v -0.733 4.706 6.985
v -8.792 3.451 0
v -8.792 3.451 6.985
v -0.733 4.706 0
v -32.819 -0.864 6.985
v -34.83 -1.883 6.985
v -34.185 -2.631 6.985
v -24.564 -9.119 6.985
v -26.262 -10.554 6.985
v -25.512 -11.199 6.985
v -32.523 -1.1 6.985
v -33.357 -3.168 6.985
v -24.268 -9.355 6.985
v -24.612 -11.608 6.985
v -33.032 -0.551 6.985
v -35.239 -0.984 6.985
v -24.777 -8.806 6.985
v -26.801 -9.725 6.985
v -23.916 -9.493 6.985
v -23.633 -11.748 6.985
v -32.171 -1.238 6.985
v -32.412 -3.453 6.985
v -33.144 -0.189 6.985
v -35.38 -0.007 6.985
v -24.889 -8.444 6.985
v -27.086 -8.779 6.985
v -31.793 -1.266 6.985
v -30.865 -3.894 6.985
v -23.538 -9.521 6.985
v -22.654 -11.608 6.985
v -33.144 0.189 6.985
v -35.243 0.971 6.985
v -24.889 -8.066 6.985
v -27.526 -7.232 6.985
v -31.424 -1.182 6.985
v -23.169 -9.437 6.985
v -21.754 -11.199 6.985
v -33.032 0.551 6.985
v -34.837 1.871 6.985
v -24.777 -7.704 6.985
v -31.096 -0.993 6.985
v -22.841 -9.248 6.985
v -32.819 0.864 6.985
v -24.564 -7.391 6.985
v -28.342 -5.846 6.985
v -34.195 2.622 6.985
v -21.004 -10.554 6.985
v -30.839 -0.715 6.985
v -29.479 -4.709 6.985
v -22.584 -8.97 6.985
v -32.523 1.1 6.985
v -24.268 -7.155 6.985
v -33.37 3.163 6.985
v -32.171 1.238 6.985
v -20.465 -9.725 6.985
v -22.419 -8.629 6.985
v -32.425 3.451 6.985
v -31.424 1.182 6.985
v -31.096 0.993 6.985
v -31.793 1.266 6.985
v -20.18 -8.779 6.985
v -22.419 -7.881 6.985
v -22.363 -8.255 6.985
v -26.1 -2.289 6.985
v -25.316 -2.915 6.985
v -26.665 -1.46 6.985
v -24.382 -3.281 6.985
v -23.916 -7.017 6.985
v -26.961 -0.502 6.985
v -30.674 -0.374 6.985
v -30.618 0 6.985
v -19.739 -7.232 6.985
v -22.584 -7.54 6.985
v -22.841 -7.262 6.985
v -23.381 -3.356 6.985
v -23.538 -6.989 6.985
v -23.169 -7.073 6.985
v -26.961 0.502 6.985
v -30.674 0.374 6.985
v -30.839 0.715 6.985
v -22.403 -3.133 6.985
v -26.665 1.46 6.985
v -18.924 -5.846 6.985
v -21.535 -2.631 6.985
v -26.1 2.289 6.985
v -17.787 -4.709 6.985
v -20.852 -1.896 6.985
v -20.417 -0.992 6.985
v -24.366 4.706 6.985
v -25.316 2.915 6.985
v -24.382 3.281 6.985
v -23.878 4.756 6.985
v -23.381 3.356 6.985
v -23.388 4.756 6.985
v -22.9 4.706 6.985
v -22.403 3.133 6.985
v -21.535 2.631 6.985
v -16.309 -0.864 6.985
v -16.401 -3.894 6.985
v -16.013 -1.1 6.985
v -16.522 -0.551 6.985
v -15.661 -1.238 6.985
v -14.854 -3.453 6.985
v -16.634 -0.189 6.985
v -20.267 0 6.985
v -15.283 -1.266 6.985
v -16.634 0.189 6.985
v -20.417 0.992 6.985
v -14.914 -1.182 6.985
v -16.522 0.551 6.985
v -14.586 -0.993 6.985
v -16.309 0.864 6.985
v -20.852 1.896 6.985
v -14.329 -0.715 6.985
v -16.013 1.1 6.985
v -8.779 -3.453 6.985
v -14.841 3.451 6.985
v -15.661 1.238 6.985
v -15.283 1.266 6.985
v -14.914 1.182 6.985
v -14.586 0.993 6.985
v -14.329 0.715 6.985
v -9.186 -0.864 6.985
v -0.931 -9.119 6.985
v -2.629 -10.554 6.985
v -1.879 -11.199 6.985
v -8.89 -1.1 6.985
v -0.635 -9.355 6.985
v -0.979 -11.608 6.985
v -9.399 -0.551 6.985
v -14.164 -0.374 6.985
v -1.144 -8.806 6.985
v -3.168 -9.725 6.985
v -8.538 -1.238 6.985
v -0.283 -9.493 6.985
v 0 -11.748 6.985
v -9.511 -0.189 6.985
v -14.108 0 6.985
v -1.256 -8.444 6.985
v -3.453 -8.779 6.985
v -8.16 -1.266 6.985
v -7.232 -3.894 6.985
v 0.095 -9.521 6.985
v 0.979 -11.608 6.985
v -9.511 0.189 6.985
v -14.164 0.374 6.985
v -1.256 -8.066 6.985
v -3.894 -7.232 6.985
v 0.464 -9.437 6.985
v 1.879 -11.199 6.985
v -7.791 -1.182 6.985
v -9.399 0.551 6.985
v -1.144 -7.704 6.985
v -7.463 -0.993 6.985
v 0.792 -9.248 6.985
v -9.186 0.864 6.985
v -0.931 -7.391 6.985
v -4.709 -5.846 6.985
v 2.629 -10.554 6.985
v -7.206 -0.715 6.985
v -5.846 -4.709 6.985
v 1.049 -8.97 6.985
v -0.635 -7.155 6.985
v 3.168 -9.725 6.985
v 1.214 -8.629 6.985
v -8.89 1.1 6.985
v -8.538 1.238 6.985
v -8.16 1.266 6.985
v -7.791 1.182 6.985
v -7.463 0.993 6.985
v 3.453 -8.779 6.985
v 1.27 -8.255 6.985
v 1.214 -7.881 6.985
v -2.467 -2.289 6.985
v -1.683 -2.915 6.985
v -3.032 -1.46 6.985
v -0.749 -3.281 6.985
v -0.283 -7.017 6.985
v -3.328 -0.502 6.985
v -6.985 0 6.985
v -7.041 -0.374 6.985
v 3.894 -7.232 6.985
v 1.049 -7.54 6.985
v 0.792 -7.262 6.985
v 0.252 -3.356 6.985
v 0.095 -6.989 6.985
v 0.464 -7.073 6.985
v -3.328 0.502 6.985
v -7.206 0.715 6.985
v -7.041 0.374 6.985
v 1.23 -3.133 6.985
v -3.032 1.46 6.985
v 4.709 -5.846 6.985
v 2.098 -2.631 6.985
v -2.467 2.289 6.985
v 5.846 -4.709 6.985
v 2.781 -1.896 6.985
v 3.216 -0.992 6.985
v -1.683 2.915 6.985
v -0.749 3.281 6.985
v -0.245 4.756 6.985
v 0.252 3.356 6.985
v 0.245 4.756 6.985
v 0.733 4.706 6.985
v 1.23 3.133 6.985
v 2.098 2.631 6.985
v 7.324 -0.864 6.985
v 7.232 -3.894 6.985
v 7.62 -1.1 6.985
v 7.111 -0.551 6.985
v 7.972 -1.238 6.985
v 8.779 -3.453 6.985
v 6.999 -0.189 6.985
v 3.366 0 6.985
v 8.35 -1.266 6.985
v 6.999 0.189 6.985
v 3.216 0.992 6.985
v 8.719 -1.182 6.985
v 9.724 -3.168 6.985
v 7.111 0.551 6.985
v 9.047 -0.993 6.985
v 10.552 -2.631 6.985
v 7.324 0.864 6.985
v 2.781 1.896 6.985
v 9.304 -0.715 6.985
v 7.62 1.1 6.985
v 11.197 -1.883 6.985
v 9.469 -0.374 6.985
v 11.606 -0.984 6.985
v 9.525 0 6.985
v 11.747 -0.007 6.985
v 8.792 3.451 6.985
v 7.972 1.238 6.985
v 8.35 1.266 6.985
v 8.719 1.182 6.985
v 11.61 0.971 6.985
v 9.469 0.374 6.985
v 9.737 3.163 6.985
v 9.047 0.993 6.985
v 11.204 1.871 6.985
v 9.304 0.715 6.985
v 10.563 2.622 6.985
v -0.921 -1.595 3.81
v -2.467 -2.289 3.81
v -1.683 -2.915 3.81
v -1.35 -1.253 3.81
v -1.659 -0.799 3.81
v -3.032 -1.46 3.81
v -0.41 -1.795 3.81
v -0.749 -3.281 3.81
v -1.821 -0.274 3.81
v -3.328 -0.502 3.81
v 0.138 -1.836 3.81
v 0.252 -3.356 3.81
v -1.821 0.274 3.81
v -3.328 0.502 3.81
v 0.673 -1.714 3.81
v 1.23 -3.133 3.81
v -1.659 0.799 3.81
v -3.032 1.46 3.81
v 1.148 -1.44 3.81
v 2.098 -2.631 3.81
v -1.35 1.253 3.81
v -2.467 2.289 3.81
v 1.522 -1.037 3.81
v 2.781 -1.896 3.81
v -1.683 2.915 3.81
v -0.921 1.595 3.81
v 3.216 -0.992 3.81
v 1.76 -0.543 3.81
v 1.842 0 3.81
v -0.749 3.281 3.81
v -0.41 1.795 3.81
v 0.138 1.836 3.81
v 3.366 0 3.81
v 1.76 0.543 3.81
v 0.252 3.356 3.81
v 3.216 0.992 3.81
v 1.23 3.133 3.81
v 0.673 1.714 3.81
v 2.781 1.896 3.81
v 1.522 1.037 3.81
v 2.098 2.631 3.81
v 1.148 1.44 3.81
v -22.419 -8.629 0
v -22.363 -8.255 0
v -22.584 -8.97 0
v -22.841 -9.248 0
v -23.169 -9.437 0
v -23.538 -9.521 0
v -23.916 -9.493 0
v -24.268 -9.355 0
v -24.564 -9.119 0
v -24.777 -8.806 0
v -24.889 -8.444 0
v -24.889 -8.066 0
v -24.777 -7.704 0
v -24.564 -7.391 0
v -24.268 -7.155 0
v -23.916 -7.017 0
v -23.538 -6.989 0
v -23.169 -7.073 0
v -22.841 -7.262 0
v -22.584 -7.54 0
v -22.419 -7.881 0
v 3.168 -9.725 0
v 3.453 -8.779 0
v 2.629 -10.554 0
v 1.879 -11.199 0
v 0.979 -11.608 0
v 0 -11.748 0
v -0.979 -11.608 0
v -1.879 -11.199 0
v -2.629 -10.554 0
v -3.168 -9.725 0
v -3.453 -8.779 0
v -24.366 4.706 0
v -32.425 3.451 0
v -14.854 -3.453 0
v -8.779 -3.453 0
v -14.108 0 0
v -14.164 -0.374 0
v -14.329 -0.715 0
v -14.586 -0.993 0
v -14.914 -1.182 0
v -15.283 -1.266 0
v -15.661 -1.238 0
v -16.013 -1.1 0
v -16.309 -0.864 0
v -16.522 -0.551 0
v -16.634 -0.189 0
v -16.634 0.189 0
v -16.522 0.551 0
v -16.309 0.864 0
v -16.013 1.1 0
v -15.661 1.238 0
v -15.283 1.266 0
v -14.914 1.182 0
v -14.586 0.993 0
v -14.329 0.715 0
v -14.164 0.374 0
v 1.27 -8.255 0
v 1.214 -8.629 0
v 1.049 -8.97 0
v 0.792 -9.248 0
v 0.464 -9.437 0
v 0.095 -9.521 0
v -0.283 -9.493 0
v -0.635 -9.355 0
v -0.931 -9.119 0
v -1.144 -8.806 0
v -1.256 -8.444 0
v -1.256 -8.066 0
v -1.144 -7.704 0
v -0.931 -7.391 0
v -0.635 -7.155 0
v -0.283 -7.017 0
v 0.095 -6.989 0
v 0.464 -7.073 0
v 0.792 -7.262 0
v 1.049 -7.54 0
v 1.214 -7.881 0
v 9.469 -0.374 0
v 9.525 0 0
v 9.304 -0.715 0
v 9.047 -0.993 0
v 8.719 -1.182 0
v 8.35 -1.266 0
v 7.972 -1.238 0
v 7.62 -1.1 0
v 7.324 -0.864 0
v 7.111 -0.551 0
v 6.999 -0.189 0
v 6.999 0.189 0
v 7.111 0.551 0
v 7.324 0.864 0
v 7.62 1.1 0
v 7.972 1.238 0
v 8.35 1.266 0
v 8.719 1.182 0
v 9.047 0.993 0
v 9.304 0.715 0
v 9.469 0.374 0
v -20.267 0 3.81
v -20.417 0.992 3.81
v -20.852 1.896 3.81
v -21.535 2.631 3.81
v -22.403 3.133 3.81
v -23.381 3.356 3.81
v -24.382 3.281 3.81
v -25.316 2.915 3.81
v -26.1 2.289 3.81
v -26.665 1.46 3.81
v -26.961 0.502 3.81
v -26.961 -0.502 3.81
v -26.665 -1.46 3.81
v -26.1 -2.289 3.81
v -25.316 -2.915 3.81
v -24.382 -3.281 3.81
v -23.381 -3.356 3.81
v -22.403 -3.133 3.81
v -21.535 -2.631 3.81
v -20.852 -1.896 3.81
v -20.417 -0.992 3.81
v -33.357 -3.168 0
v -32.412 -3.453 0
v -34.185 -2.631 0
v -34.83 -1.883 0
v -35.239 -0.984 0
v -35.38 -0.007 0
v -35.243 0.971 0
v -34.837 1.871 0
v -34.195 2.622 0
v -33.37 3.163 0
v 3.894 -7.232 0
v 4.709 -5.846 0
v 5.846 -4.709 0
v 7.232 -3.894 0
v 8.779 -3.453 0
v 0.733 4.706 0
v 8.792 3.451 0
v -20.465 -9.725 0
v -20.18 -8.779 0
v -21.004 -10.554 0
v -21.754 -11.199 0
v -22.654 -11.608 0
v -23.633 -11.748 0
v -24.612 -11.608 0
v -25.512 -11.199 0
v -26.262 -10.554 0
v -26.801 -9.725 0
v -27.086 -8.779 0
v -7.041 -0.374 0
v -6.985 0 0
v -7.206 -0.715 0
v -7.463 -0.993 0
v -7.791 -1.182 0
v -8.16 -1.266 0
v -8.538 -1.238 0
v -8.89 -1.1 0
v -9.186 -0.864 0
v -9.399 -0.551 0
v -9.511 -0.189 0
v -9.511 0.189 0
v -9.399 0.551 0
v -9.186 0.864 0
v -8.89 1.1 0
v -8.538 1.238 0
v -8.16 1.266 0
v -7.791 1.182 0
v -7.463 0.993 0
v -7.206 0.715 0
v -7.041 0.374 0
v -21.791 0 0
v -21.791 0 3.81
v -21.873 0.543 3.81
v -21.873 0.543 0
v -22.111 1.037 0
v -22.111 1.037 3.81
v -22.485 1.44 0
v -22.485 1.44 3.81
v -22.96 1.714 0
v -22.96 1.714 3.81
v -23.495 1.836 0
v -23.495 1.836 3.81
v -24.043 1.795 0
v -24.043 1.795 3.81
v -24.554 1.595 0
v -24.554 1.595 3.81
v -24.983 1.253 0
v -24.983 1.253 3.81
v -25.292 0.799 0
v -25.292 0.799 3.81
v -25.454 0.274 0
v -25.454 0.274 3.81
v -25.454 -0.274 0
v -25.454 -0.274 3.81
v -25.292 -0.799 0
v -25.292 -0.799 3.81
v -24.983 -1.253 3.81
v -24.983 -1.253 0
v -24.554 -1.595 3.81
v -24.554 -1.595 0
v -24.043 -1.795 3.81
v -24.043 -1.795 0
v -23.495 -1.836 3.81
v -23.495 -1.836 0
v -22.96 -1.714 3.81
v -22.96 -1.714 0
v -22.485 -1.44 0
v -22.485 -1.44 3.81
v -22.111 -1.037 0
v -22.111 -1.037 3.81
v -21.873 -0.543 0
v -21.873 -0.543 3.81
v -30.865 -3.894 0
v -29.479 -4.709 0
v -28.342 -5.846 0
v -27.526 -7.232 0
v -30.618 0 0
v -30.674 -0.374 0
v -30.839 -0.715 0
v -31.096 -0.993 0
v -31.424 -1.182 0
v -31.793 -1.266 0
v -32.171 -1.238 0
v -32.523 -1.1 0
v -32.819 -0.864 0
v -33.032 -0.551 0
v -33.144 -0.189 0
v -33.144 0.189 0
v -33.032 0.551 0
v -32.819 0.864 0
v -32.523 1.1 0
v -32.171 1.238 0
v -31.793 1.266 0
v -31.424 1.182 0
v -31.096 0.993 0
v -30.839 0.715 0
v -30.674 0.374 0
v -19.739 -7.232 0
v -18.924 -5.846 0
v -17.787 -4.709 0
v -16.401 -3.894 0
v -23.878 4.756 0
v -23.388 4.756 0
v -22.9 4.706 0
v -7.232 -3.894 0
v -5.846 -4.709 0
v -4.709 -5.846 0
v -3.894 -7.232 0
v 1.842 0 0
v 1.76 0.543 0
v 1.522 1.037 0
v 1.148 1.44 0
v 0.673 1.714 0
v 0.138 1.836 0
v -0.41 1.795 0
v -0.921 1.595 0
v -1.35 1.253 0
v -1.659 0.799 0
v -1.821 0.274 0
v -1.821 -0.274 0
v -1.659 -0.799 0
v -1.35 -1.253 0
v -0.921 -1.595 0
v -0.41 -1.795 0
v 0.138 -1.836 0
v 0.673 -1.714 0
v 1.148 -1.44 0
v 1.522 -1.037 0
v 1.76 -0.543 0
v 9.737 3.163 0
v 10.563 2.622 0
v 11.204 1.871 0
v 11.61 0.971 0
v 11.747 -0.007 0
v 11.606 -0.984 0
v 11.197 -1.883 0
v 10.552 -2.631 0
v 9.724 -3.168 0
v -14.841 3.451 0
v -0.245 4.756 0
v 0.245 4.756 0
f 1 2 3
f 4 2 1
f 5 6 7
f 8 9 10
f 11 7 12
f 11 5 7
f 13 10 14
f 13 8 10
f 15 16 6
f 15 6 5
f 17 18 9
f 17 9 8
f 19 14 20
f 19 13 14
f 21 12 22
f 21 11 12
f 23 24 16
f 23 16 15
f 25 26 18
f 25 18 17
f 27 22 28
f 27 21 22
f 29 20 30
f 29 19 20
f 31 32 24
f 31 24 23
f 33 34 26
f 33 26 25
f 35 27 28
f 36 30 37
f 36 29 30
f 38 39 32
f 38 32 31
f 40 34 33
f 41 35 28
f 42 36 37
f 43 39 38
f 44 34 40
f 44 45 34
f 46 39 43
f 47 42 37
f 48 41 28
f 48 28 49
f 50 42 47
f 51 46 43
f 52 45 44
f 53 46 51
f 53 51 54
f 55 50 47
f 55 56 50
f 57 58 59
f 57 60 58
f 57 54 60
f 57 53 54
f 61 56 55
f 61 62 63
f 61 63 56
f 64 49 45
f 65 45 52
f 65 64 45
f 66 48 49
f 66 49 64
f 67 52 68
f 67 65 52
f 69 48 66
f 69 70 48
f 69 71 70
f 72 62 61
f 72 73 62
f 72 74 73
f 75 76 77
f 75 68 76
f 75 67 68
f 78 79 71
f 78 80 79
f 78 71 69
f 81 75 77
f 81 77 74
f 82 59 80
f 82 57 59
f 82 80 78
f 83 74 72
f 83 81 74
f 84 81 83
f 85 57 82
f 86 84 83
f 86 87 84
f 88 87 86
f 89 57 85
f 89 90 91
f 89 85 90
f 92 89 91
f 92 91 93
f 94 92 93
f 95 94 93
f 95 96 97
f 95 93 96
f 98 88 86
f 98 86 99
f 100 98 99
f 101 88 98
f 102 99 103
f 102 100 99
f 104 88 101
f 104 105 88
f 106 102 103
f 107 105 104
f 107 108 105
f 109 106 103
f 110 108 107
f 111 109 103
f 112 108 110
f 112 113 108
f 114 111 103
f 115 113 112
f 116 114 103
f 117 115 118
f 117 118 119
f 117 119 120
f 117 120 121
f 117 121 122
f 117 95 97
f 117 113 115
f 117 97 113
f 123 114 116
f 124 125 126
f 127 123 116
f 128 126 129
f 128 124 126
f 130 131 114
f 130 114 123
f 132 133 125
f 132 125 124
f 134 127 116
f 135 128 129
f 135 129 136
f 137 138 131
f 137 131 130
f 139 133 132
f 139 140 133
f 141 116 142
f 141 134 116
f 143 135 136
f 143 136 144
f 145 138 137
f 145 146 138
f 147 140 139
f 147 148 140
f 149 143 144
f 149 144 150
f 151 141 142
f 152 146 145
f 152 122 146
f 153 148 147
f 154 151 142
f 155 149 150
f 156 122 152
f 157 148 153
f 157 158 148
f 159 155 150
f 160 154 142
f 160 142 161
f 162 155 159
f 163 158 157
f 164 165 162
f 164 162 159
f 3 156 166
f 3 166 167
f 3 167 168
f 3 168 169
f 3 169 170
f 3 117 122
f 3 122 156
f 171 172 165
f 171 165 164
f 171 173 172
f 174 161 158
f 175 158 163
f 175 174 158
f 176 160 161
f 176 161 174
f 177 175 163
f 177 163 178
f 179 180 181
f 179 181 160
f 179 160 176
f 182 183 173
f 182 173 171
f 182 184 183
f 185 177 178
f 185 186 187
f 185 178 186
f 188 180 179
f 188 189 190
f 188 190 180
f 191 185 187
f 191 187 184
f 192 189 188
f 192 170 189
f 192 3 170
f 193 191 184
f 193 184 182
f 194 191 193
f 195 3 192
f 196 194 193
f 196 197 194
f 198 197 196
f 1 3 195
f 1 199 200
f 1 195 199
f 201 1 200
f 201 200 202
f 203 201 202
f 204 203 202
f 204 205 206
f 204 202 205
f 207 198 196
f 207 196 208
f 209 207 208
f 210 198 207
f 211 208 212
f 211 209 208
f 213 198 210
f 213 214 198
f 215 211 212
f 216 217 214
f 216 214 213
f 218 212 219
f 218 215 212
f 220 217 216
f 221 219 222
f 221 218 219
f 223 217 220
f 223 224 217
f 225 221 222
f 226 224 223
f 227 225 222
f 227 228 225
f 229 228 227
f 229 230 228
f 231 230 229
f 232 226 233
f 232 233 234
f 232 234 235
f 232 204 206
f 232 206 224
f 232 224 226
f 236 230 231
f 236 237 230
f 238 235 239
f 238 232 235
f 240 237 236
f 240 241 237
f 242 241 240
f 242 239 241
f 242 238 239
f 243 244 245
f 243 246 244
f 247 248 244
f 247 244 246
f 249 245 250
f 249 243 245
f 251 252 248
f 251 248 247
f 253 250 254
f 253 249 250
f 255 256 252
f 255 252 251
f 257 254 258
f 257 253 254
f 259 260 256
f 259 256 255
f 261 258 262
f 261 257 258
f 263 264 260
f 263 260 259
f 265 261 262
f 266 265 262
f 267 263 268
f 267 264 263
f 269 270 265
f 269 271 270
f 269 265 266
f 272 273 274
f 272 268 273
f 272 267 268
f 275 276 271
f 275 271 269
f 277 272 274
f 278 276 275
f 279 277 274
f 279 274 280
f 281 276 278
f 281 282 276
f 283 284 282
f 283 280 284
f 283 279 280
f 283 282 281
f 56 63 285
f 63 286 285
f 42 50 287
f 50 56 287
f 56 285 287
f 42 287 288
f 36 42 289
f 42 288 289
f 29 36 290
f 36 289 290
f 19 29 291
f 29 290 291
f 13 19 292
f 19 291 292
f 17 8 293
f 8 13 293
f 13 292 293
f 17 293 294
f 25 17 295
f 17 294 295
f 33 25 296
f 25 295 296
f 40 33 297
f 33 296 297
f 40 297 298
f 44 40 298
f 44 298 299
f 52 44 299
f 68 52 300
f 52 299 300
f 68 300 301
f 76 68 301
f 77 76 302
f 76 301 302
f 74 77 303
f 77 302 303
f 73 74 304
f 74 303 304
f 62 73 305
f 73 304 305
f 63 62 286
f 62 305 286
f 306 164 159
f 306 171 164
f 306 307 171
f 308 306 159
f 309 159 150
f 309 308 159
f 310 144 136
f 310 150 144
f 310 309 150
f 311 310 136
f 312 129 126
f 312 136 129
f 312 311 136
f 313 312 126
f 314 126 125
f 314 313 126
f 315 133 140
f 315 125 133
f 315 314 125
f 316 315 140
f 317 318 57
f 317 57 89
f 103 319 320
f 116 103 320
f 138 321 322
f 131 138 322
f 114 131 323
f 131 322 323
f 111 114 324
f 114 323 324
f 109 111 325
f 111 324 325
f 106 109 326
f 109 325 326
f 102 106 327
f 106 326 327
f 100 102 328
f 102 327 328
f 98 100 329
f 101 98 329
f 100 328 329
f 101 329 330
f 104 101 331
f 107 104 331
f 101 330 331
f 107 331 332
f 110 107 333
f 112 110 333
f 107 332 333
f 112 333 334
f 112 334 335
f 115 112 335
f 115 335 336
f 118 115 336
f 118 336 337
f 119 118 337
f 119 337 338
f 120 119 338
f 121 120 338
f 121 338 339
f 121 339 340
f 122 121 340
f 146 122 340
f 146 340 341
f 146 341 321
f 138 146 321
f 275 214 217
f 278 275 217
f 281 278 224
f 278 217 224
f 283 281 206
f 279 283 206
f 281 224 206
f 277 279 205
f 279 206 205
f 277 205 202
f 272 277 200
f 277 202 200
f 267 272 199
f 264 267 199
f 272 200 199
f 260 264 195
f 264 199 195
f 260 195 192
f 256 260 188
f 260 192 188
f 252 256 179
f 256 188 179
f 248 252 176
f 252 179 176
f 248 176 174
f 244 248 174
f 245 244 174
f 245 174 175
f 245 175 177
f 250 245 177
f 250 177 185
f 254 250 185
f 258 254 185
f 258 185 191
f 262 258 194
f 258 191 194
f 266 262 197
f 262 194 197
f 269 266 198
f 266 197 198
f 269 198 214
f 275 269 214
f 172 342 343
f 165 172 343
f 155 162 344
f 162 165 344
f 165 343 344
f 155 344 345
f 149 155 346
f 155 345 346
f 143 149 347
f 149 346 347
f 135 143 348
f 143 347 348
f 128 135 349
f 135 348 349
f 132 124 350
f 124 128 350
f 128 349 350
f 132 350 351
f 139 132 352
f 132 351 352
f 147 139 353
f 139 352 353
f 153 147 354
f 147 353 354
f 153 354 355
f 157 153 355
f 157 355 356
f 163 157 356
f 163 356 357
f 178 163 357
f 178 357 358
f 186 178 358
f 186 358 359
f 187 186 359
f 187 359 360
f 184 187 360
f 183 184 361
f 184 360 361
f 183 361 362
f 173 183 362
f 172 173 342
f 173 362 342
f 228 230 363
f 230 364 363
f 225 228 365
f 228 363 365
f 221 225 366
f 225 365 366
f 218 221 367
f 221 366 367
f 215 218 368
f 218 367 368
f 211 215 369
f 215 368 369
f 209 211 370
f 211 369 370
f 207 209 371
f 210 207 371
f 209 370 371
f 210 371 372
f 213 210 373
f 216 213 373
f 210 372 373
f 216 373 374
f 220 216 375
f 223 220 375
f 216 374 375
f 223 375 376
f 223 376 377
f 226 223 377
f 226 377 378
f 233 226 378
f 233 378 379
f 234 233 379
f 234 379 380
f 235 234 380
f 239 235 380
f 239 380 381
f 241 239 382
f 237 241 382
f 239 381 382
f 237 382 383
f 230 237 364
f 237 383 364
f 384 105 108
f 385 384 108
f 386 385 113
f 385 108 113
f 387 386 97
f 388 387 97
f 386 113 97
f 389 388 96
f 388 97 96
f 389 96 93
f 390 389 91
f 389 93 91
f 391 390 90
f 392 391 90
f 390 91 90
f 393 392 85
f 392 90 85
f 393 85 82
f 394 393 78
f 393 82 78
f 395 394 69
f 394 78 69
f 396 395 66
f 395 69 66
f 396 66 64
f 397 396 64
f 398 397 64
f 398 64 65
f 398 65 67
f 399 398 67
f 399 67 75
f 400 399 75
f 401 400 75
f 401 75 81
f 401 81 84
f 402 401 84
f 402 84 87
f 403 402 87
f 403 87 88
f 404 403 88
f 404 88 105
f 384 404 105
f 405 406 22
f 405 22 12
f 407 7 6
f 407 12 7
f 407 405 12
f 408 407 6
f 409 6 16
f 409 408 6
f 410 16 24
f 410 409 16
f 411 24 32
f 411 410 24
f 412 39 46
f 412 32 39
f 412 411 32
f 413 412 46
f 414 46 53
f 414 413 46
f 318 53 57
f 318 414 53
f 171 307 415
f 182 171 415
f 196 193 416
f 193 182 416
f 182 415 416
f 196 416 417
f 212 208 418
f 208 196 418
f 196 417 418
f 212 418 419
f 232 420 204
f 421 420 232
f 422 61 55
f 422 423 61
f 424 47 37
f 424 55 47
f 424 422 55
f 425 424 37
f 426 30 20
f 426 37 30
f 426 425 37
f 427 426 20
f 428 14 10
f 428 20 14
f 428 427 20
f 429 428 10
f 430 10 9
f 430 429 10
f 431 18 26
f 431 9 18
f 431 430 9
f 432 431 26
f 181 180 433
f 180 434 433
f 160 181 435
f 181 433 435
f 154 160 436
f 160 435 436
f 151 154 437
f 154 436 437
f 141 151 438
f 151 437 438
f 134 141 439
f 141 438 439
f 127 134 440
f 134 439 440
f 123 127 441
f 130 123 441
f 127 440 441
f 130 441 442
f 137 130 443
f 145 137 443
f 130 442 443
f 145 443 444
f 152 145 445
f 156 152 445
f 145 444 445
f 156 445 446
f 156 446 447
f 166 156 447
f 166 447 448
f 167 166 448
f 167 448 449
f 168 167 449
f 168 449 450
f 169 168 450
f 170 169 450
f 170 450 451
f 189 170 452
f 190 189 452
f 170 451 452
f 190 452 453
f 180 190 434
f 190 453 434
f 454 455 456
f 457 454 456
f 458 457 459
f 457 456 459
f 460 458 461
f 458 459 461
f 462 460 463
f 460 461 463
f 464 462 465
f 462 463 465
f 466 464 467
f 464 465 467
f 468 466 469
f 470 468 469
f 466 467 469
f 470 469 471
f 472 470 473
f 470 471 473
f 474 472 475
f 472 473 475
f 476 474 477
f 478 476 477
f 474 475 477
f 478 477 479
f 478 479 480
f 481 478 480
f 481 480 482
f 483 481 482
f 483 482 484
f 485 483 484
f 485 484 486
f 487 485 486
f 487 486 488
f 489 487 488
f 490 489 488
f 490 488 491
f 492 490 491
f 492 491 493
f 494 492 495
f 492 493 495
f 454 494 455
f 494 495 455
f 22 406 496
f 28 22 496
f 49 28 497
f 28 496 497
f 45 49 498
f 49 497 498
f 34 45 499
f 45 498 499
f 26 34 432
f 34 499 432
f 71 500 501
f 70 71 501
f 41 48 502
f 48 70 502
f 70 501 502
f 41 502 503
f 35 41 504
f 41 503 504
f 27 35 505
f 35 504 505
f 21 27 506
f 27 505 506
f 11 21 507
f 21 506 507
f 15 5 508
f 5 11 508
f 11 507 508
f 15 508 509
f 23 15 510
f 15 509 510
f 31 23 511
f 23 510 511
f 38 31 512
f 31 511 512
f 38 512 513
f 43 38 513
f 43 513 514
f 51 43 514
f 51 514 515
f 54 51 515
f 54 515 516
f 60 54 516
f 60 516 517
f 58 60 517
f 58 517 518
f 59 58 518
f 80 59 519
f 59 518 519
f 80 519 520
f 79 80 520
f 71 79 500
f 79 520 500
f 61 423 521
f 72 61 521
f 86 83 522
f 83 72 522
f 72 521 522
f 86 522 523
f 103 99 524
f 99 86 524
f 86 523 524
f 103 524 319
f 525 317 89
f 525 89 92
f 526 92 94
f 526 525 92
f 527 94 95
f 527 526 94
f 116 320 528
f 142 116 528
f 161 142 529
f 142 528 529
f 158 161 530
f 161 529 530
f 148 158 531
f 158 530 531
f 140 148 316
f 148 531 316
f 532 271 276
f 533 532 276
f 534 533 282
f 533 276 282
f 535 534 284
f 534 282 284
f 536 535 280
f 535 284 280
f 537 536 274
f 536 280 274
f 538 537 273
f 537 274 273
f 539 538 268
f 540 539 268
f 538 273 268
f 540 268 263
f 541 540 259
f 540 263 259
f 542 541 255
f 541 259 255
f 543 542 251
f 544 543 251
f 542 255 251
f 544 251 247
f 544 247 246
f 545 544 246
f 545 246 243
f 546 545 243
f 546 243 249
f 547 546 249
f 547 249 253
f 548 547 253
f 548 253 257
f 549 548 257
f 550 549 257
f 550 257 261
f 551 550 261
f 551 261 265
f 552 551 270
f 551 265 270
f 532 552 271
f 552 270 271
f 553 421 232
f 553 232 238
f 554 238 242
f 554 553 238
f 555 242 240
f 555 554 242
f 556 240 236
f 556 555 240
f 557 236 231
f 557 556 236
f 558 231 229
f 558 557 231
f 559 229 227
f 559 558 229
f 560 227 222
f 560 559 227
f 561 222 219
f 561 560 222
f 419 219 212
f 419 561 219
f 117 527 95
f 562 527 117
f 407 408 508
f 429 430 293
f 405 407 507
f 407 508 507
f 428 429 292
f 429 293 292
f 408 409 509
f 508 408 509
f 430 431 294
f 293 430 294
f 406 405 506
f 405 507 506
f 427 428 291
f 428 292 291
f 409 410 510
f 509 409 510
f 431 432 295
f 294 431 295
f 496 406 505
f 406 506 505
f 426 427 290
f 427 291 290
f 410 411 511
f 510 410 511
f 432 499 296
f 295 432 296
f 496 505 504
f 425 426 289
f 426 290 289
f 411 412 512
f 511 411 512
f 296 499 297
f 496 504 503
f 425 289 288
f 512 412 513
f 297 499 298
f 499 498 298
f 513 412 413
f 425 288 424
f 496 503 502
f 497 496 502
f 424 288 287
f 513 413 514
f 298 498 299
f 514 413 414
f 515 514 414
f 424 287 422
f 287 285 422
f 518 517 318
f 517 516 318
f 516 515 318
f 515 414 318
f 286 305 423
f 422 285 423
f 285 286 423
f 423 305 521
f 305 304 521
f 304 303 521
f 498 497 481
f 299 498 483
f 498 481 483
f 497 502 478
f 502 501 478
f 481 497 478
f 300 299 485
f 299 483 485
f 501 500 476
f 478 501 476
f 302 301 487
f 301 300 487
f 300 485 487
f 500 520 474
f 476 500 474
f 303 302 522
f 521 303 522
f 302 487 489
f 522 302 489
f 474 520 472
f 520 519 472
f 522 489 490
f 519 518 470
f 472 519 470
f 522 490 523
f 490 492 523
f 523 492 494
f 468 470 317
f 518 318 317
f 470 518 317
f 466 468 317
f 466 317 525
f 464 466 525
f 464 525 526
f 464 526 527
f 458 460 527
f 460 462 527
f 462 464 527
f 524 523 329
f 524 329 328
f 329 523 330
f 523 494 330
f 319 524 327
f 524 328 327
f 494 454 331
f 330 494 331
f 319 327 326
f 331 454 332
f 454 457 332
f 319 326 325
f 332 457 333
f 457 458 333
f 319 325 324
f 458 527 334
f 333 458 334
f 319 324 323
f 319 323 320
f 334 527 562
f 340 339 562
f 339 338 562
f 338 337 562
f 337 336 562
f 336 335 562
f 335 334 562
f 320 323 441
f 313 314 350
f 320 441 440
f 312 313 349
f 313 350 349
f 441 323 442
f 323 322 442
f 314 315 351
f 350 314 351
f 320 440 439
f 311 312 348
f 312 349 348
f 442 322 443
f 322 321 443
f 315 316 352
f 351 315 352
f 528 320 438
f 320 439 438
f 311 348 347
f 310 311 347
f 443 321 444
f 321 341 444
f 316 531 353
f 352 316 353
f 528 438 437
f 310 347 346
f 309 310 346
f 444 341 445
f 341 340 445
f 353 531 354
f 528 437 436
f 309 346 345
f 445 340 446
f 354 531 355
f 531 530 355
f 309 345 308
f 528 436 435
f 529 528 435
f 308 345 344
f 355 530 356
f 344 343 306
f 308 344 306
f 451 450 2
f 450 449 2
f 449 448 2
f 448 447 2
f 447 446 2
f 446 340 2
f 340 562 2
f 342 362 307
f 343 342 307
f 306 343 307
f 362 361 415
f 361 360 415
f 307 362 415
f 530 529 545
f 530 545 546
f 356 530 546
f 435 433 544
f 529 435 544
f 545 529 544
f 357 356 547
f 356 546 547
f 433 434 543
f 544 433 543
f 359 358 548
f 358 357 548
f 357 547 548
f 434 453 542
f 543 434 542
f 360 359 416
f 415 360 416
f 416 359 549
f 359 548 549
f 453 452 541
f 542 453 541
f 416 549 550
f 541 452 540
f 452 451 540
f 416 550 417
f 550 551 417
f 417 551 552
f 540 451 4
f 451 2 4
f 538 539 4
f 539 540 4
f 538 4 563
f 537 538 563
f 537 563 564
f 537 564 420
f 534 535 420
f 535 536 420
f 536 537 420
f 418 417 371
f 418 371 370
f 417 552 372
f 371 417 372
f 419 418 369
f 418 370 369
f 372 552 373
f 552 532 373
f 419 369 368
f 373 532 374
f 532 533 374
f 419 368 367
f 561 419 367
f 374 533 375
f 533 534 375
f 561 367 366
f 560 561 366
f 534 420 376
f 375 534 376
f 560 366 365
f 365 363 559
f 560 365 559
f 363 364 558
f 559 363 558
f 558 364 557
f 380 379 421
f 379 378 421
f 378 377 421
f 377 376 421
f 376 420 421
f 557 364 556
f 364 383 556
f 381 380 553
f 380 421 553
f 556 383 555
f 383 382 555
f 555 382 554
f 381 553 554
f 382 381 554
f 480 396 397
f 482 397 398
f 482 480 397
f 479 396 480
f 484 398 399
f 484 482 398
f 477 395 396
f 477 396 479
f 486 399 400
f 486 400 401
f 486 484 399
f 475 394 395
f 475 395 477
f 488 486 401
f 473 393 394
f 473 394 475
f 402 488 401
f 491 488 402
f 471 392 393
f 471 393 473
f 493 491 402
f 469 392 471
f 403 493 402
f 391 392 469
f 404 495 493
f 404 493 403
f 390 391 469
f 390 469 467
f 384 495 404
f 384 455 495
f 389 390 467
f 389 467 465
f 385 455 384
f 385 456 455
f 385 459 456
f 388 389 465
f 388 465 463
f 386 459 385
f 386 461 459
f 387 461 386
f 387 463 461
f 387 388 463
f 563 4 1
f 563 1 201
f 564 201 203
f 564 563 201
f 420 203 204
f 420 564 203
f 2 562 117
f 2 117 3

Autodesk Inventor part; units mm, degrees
ref_plane "YZ Plane" through (0, 0, 0) normal (1, 0, 0) x (0, 1, 0)
ref_plane "XZ Plane" through (0, 0, 0) normal (0, 1, 0) x (-1, 0, 0)
ref_plane "XY Plane" through (0, 0, 0) normal (0, 0, 1) x (1, 0, 0)
sketch "Sketch5" plane through (0, 0, 0) normal (0, 0, 1) x (1, 0, 0)
  line L0 (0, 0) -> (8.255, 0)
  circle A0 centre (8.255, 0) radius 1.27
  circle A1 centre (0, -8.255) radius 1.27
  circle A2 centre (-8.255, 0) radius 1.27
  line L1 (0, 0) -> (-23.6329, 0)
  line L2 (-23.6329, 0) -> (-15.3779, 0)
  circle A3 centre (-15.3779, 0) radius 1.27
  circle A4 centre (-23.6329, -8.255) radius 1.27
  circle A5 centre (-31.8879, 0) radius 1.27
  circle A6 centre (-31.8879, 0) radius 3.4925
  circle A7 centre (-23.6329, -8.255) radius 3.4925
  circle A8 centre (-15.3779, 0) radius 3.4925
  circle A9 centre (-8.255, 0) radius 3.4925
  circle A10 centre (0, -8.255) radius 3.4925
  circle A11 centre (8.255, 0) radius 3.4925
  circle A12 centre (-23.6329, 0) radius 4.7625
  circle A13 centre (0, 0) radius 4.7625
  line L3 (-32.4252, 3.4509) -> (-24.3656, 4.7058)
  line L4 (-22.9002, 4.7058) -> (-14.8406, 3.4509)
  line L5 (-8.7923, 3.4509) -> (-0.7327, 4.7058)
  line L6 (0.7327, 4.7058) -> (8.7923, 3.4509)
  arc A14 (8.7788, -3.453) -> (3.453, -8.7788) centre (9.7312, -9.7312) ccw
  arc A15 (-3.453, -8.7788) -> (-8.7788, -3.453) centre (-9.7312, -9.7312) ccw
  arc A16 (-14.8541, -3.453) -> (-20.1799, -8.7788) centre (-13.9017, -9.7312) ccw
  arc A17 (-27.0859, -8.7788) -> (-32.4117, -3.453) centre (-33.3641, -9.7312) ccw
  line L7 (-14.8406, 3.4509) -> (-8.7923, 3.4509)
  line L8 (-14.8541, -3.453) -> (-8.7788, -3.453)
  dimension "d45" = 8.255
  dimension "d46" = 2.54
  dimension "d49" = 180
  dimension "d51" = 23.6329
  dimension "d52" = 8.255
  dimension "d53" = 2.54
  dimension "d56" = 180
  dimension "d58" = 6.985
  dimension "d59" = 6.985
  dimension "d60" = 6.985
  dimension "d61" = 6.985
  dimension "d62" = 6.985
  dimension "d63" = 6.985
  dimension "d64" = 9.525
  dimension "d65" = 9.525
  dimension "d66" = 6.35
  dimension "d67" = 6.35
  dimension "d68" = 6.35
  dimension "d69" = 6.35
extrude "Extrusion7" add sketch "Sketch5" along normal blind 6.985 contours L1 A13 L0 | L0 A13 L1 | A13 L6 A11 | A11 | A11 A14 A10 A13 | A9 L1 A2 | L1 A2 A9 | A13 A10 A15 A9 | A9 L5 A13 | A10 | A9 L1 A8 L7 | L8 A8 L1 A9 | A8 L1 A3 | A8 A12 L4 | A16 A7 A12 A8 | A8 L1 A3 | A12 | A7 | A7 A17 A6 A12 | A12 A6 L3 | A6
sketch "Sketch6" plane through (0, 0, 6.985) normal (0, 0, 1) x (1, 0, 0)
  circle A0 centre (0, 0) radius 1.8415
  circle A1 centre (0, 0) radius 3.3655
  circle A2 centre (-23.6329, 0) radius 1.8415
  circle A3 centre (-23.6329, 0) radius 3.3655
  dimension "d72" = 3.683
  dimension "d73" = 6.731
  dimension "d74" = 23.6329
  dimension "d75" = 3.683
  dimension "d76" = 6.731
extrude "Extrusion8" cut sketch "Sketch6" against normal through all contours A0 | A2
extrude "Extrusion9" cut sketch "Sketch6" against normal blind 3.175
equation "\"d59\" = d58"
equation "\"d60\" = d58"
equation "\"d61\" = d58"
equation "\"d62\" = d58"
equation "\"d63\" = d58"
equation "\"d67\" = d66"
equation "\"d68\" = d66"
equation "\"d69\" = d66"
properties part number "carriageIdlerPinionExtension" material "ABS Plastic"
